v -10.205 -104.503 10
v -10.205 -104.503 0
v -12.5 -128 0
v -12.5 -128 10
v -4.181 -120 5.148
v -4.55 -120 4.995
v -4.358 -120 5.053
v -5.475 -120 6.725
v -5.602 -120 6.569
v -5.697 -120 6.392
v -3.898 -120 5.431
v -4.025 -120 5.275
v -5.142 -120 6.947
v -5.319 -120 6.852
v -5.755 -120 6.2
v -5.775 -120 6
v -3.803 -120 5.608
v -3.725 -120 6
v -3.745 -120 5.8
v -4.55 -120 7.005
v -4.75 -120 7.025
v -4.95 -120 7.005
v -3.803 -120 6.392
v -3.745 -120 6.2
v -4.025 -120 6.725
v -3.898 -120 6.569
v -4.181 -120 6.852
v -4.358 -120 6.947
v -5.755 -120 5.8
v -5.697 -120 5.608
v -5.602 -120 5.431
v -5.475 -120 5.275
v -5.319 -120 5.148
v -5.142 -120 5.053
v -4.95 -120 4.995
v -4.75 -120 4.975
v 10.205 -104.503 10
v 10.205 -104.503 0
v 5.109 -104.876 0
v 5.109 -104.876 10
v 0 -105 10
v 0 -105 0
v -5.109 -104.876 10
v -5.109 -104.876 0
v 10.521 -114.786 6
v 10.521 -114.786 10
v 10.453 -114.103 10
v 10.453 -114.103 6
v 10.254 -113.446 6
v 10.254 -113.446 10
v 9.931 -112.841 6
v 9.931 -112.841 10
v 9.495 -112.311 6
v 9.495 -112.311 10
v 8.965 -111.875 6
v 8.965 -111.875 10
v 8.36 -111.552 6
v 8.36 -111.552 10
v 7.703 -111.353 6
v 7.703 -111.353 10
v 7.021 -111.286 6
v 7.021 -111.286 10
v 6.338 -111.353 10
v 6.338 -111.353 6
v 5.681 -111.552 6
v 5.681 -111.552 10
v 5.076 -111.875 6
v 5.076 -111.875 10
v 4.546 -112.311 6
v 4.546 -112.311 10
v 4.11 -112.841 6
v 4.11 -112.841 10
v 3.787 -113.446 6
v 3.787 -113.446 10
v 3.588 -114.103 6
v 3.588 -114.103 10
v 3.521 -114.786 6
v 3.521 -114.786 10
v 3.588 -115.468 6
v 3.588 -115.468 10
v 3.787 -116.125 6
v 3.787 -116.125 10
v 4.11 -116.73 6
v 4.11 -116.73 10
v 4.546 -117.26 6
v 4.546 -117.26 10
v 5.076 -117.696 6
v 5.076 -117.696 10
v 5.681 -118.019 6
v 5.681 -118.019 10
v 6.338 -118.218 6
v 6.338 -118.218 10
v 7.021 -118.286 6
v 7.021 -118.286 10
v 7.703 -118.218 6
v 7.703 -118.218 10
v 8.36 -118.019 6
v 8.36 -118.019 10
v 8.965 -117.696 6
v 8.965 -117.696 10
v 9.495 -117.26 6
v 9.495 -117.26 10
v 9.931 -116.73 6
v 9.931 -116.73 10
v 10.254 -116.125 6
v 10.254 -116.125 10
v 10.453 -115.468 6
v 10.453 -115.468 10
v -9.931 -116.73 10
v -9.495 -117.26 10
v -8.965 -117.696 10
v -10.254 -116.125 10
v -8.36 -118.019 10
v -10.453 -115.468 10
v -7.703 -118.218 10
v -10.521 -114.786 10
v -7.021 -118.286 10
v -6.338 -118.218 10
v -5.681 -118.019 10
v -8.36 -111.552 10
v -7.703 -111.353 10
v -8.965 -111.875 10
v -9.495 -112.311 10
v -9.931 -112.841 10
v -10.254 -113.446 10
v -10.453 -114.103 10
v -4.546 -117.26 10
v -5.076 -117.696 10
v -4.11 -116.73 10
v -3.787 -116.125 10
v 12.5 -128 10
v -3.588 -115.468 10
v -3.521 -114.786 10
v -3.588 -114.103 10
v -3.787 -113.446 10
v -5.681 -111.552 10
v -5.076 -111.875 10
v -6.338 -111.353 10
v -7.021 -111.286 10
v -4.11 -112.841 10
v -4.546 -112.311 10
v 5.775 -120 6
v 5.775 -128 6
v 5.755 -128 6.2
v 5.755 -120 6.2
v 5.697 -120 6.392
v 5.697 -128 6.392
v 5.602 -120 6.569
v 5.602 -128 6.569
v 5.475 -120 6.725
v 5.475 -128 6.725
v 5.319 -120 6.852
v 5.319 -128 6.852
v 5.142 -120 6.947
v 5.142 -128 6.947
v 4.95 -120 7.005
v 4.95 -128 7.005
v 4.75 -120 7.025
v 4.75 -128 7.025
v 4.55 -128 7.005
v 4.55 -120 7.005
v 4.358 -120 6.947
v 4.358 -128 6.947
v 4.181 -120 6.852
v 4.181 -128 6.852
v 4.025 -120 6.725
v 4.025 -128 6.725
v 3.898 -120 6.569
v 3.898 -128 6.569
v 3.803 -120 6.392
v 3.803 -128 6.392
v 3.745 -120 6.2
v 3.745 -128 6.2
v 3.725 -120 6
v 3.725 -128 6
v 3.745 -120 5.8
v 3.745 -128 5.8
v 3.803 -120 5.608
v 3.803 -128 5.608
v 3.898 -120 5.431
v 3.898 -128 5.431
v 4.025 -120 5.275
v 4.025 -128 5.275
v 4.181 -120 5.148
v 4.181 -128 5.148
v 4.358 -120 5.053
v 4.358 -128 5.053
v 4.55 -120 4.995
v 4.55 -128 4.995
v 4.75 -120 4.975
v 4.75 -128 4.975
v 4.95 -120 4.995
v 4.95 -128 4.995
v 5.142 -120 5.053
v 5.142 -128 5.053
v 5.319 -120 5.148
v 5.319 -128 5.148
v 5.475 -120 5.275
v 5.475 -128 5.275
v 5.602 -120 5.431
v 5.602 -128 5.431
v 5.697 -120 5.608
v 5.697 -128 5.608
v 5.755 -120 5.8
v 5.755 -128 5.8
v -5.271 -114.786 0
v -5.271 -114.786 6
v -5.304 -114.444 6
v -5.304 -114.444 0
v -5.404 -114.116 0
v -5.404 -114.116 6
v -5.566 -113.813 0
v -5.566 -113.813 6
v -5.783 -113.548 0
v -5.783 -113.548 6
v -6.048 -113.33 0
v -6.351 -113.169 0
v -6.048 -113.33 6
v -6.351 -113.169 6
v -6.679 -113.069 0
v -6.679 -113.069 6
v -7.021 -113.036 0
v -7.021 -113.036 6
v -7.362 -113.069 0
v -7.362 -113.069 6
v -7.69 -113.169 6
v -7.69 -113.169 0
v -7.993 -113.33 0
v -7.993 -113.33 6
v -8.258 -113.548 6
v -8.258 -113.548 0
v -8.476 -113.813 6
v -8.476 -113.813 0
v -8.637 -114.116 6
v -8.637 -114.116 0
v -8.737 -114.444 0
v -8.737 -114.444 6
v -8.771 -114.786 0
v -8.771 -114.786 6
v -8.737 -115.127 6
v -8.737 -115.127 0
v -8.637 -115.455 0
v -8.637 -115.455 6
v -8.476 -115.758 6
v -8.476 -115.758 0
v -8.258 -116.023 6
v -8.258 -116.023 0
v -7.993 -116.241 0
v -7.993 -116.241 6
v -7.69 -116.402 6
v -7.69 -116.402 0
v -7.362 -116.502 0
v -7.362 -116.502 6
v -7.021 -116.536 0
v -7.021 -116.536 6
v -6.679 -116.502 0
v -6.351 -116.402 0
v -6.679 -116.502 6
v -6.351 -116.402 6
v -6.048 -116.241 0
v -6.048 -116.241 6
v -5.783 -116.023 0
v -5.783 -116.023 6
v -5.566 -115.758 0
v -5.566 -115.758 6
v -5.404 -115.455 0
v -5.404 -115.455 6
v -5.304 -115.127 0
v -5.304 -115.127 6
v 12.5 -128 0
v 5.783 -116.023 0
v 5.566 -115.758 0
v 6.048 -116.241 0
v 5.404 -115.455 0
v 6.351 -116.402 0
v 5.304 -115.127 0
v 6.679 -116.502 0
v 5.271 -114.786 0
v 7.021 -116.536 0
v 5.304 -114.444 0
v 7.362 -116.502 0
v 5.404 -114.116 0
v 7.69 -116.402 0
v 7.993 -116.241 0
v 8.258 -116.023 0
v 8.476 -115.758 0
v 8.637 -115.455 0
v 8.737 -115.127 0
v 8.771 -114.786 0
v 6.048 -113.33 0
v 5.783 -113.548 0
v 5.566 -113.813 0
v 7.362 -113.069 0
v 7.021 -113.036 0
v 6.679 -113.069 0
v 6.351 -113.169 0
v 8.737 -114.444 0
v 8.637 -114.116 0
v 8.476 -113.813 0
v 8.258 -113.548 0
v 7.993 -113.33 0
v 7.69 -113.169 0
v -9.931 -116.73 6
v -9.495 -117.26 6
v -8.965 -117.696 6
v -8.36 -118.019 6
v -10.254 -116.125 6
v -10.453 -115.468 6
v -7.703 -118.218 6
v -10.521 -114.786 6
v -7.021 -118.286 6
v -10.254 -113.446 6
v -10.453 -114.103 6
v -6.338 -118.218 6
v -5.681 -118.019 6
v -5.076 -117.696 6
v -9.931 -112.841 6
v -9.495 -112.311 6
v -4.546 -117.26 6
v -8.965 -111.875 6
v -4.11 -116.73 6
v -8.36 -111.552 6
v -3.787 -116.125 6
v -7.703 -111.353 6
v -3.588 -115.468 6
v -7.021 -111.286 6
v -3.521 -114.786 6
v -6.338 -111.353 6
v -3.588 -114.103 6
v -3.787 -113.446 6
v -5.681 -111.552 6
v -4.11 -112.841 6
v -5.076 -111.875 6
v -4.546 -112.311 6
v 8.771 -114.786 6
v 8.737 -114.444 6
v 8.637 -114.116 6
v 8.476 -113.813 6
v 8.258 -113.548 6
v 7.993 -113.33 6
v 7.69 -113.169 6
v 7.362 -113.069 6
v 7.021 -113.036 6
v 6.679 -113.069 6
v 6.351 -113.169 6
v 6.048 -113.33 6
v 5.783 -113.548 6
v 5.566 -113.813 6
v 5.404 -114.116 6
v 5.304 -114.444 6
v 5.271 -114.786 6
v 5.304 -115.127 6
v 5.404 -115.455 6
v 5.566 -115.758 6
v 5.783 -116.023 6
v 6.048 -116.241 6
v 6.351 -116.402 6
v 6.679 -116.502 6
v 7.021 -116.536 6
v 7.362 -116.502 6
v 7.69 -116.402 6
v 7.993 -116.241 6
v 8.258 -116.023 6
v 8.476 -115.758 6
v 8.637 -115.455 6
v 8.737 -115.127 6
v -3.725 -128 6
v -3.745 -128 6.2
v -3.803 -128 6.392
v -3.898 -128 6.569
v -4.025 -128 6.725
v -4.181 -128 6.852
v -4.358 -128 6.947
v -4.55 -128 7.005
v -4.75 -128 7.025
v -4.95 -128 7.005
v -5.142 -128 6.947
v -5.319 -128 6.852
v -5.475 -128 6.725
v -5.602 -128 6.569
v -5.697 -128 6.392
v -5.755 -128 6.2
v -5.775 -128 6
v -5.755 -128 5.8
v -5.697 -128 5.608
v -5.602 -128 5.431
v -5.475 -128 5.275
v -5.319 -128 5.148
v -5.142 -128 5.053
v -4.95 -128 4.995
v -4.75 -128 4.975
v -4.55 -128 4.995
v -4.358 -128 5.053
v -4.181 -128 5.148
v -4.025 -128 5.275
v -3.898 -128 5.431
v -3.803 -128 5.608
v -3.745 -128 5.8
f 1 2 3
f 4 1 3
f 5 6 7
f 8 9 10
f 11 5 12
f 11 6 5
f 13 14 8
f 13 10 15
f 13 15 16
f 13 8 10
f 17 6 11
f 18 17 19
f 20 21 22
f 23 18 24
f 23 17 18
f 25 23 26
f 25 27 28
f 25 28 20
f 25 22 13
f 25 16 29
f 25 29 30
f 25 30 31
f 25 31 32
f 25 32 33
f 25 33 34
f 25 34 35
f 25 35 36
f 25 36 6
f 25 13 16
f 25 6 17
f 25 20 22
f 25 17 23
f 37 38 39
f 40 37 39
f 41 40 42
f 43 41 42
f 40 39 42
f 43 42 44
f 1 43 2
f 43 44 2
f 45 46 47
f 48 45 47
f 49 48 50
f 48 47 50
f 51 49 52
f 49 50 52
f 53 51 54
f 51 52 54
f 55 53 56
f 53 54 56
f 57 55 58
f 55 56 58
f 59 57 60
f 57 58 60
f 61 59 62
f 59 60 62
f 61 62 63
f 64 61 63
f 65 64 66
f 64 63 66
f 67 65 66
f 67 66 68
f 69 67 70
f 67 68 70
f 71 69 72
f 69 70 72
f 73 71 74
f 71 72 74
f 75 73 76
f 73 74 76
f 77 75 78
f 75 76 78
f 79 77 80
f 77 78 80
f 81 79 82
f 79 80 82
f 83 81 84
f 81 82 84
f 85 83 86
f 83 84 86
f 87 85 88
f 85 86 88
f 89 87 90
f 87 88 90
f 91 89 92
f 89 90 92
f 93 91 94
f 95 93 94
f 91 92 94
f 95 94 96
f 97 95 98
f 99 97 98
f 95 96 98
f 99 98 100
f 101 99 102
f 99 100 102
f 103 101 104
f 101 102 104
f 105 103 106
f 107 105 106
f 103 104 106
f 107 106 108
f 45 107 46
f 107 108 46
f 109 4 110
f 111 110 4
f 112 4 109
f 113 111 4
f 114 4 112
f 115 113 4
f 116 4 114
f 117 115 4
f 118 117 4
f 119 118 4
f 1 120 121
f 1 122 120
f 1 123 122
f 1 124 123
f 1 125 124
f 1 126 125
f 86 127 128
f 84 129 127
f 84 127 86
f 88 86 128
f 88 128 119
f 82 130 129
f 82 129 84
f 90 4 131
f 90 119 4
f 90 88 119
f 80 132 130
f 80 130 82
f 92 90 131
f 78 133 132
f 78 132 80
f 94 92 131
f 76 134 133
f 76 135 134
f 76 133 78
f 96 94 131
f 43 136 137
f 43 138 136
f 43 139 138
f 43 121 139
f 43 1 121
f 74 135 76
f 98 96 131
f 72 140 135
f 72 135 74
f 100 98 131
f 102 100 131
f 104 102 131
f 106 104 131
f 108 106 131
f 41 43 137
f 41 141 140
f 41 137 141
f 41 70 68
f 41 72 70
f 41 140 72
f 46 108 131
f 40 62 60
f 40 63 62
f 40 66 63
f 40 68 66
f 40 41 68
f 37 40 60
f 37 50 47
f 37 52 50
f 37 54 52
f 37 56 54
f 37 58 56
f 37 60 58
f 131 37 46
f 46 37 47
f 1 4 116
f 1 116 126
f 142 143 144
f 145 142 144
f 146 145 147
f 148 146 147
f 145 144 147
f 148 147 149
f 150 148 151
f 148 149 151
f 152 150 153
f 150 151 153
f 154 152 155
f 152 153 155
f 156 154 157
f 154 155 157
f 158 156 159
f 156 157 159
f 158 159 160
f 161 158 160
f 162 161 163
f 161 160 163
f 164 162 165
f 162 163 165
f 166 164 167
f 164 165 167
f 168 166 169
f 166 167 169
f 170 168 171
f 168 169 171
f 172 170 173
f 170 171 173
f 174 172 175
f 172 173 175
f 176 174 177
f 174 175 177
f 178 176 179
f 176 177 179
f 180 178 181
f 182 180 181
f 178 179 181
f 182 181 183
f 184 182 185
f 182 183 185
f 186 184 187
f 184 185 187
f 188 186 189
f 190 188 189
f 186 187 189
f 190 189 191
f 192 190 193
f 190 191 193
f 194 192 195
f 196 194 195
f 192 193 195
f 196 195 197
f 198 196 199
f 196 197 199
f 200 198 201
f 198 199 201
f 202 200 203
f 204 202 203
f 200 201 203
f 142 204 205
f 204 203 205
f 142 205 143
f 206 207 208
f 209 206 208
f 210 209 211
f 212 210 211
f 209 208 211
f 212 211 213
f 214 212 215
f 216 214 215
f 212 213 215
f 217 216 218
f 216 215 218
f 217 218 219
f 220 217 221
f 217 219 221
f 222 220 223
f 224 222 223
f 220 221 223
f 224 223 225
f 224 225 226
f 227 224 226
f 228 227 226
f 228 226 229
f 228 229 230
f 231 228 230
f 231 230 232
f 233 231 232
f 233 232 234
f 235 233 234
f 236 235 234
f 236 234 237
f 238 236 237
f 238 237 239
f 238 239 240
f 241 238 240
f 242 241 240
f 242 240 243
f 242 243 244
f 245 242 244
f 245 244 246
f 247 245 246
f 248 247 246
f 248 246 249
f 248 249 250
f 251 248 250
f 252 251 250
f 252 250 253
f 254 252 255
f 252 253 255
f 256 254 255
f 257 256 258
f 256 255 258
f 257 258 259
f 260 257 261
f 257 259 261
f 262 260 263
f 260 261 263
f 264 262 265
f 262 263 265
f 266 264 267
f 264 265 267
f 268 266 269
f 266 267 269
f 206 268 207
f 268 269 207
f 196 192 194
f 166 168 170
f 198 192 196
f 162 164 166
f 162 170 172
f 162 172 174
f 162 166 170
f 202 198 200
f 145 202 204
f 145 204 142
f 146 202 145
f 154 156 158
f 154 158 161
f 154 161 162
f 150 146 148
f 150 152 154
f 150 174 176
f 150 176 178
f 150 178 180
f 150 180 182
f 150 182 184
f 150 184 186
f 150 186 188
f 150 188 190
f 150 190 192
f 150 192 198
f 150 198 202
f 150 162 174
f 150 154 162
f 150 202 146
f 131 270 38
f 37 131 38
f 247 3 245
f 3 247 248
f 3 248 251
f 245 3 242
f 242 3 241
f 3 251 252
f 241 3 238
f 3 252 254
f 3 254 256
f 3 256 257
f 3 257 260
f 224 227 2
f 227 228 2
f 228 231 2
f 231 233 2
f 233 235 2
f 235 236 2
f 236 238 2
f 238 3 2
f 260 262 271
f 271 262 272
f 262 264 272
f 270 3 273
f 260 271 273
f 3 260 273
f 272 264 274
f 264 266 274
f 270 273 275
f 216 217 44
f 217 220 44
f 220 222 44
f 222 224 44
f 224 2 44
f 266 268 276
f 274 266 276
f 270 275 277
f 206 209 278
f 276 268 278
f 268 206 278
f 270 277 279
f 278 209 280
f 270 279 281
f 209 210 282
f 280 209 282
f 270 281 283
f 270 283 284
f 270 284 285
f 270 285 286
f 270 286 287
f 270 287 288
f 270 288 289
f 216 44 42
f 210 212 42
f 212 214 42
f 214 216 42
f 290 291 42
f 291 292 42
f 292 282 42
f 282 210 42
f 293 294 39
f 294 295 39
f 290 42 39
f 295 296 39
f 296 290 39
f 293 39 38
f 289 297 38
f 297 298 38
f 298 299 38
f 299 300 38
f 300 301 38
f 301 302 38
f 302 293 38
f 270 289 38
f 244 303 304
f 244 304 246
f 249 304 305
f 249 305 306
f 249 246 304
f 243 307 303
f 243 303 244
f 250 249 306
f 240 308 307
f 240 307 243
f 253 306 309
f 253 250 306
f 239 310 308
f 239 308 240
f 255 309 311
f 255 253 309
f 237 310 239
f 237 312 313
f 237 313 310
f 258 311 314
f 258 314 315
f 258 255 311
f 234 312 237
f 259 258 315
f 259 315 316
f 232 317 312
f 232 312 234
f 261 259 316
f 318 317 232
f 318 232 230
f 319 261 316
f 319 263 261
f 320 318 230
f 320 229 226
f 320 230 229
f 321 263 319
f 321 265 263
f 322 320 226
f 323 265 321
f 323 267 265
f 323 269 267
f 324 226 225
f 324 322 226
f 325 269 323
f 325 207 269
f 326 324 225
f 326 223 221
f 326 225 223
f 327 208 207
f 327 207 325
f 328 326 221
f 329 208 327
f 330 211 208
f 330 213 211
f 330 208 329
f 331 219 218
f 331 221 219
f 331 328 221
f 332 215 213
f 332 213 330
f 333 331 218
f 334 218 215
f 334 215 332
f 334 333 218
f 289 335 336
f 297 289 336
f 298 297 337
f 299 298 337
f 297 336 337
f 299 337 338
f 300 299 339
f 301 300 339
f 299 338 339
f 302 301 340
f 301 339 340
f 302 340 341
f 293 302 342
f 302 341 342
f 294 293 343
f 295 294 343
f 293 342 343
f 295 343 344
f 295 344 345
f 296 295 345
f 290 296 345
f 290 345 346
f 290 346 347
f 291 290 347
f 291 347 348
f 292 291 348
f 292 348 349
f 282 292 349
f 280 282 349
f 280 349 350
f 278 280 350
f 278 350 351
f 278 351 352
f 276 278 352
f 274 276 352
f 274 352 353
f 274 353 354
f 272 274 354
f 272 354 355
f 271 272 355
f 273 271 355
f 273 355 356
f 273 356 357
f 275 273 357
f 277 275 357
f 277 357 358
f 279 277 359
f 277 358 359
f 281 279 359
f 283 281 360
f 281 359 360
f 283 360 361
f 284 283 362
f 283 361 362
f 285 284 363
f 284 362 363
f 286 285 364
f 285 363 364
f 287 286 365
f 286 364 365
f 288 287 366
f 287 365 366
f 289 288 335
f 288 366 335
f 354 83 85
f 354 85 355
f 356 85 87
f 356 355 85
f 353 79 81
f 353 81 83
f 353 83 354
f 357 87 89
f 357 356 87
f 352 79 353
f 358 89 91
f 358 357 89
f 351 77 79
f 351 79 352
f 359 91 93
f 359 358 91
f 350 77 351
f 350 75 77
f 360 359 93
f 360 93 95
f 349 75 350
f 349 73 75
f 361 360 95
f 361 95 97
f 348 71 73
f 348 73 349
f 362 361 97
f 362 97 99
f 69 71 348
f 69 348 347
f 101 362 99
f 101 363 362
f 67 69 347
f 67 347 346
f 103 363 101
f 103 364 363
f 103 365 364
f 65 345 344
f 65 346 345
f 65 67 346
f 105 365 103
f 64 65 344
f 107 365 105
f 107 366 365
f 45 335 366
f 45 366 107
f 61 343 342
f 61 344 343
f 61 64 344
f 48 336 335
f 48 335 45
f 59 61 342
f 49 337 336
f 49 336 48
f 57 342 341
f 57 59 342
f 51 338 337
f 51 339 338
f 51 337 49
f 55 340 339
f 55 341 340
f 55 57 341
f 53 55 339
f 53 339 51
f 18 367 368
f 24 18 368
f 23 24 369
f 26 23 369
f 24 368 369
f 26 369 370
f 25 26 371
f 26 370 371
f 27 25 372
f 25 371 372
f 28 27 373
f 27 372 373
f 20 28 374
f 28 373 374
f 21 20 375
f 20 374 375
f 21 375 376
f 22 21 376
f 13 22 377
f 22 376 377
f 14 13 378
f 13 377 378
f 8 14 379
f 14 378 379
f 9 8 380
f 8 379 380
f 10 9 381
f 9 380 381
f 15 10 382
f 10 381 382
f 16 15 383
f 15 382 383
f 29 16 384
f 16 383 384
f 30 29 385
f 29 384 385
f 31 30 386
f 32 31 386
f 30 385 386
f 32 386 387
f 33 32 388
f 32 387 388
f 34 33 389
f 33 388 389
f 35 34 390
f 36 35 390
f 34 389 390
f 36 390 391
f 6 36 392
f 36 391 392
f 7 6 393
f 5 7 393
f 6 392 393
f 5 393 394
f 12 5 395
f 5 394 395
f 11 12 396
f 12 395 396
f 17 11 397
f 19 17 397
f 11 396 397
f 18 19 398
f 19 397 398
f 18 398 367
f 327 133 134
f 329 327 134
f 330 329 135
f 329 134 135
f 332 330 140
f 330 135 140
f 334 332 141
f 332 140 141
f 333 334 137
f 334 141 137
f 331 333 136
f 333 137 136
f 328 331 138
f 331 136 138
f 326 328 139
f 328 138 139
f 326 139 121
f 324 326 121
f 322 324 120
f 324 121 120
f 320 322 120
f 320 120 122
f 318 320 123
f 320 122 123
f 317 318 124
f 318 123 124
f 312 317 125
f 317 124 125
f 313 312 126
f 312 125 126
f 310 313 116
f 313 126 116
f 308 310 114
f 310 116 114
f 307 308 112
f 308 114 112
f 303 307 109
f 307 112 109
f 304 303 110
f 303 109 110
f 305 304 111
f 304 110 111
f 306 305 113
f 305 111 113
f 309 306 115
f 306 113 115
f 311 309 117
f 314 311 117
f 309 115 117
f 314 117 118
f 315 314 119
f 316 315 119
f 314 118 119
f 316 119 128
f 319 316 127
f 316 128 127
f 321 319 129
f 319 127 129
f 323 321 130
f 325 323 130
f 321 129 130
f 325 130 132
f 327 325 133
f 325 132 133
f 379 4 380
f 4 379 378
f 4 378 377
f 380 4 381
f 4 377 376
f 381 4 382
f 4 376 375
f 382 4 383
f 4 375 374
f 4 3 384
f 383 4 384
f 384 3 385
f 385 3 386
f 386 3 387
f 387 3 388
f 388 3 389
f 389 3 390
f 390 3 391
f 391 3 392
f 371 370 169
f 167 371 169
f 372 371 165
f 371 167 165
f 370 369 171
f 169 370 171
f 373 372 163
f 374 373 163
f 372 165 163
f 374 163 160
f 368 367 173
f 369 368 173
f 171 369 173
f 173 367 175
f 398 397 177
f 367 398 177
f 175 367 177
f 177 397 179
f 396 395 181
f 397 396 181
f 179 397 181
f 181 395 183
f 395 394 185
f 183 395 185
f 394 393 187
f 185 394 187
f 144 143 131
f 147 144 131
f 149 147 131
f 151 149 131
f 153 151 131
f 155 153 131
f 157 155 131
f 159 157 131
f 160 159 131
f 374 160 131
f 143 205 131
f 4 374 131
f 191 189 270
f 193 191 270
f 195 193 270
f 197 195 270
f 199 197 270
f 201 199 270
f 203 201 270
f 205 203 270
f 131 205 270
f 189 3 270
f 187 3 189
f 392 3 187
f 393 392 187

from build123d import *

# Parameters (mm, degrees)
BOSS_EXTRU_1_DEPTH      = 10
ESQUISSE2_R             = 1.025
ENL_V_MAT_EXTRU_1_DEPTH = 8
ENL_V_MAT_EXTRU_2_REACH = 130.997
ESQUISSE3_R             = 1.75
ESQUISSE4_R             = 3.5
ESQUISSE4_R_2           = 1.75
ENL_V_MAT_EXTRU_3_DEPTH = 4


with BuildPart() as part:
    # Esquisse1 → Boss.-Extru.1 (new body)
    with BuildSketch(Plane.XY):
        with BuildLine():
            Line((-12.5, -128), (12.5, -128))
            Line((12.5, -128), (10.205358779, -104.502873894))
            ThreePointArc((10.205358779, -104.502873894), (0, -105), (-10.205358779, -104.502873894))
            Line((-10.205358779, -104.502873894), (-12.5, -128))
        make_face()
    extrude(amount=BOSS_EXTRU_1_DEPTH)

    # Esquisse2 → Enlèv. mat.-Extru.1 (cut)
    with BuildSketch(Plane.XZ.offset(128)):
        with Locations((-4.75, 6)):
            Circle(ESQUISSE2_R)
        with Locations((4.75, 6)):
            Circle(ESQUISSE2_R)
    extrude(amount=-ENL_V_MAT_EXTRU_1_DEPTH, mode=Mode.SUBTRACT)

    # Esquisse3 → Enlèv. mat.-Extru.2 (cut, up to next)
    with BuildSketch(Plane.XY.offset(10), mode=Mode.PRIVATE) as enl_v_mat_extru_2_sk1:
        with Locations((-7.020582047, -114.785501819)):
            Circle(ESQUISSE3_R)
    enl_v_mat_extru_2_tool1 = extrude(enl_v_mat_extru_2_sk1.sketch, amount=-ENL_V_MAT_EXTRU_2_REACH, mode=Mode.PRIVATE) & part.part
    # Esquisse3 → Enlèv. mat.-Extru.2 (cut, up to next)
    with BuildSketch(Plane.XY.offset(10), mode=Mode.PRIVATE) as enl_v_mat_extru_2_sk2:
        with Locations((7.020582047, -114.785501819)):
            Circle(ESQUISSE3_R)
    enl_v_mat_extru_2_tool2 = extrude(enl_v_mat_extru_2_sk2.sketch, amount=-ENL_V_MAT_EXTRU_2_REACH, mode=Mode.PRIVATE) & part.part
    add(enl_v_mat_extru_2_tool1.solids().sort_by_distance((-7.020582, -114.785502, 10))[0], mode=Mode.SUBTRACT)
    add(enl_v_mat_extru_2_tool2.solids().sort_by_distance((7.020582, -114.785502, 10))[0], mode=Mode.SUBTRACT)

    # Esquisse4 → Enlèv. mat.-Extru.3 (cut)
    # profile 1 of 2: a face of its own
    with BuildSketch(Plane.XY.offset(10)):
        with Locations((7.020582047, -114.785501819)):
            Circle(ESQUISSE4_R)
        with Locations((7.020582047, -114.785501819)):
            Circle(ESQUISSE4_R_2, mode=Mode.SUBTRACT)
    # profile 2 of 2: a face of its own
    with BuildSketch(Plane.XY.offset(10)):
        with Locations((-7.020582047, -114.785501819)):
            Circle(ESQUISSE4_R)
    extrude(amount=-ENL_V_MAT_EXTRU_3_DEPTH, mode=Mode.SUBTRACT)


solid = part.part
